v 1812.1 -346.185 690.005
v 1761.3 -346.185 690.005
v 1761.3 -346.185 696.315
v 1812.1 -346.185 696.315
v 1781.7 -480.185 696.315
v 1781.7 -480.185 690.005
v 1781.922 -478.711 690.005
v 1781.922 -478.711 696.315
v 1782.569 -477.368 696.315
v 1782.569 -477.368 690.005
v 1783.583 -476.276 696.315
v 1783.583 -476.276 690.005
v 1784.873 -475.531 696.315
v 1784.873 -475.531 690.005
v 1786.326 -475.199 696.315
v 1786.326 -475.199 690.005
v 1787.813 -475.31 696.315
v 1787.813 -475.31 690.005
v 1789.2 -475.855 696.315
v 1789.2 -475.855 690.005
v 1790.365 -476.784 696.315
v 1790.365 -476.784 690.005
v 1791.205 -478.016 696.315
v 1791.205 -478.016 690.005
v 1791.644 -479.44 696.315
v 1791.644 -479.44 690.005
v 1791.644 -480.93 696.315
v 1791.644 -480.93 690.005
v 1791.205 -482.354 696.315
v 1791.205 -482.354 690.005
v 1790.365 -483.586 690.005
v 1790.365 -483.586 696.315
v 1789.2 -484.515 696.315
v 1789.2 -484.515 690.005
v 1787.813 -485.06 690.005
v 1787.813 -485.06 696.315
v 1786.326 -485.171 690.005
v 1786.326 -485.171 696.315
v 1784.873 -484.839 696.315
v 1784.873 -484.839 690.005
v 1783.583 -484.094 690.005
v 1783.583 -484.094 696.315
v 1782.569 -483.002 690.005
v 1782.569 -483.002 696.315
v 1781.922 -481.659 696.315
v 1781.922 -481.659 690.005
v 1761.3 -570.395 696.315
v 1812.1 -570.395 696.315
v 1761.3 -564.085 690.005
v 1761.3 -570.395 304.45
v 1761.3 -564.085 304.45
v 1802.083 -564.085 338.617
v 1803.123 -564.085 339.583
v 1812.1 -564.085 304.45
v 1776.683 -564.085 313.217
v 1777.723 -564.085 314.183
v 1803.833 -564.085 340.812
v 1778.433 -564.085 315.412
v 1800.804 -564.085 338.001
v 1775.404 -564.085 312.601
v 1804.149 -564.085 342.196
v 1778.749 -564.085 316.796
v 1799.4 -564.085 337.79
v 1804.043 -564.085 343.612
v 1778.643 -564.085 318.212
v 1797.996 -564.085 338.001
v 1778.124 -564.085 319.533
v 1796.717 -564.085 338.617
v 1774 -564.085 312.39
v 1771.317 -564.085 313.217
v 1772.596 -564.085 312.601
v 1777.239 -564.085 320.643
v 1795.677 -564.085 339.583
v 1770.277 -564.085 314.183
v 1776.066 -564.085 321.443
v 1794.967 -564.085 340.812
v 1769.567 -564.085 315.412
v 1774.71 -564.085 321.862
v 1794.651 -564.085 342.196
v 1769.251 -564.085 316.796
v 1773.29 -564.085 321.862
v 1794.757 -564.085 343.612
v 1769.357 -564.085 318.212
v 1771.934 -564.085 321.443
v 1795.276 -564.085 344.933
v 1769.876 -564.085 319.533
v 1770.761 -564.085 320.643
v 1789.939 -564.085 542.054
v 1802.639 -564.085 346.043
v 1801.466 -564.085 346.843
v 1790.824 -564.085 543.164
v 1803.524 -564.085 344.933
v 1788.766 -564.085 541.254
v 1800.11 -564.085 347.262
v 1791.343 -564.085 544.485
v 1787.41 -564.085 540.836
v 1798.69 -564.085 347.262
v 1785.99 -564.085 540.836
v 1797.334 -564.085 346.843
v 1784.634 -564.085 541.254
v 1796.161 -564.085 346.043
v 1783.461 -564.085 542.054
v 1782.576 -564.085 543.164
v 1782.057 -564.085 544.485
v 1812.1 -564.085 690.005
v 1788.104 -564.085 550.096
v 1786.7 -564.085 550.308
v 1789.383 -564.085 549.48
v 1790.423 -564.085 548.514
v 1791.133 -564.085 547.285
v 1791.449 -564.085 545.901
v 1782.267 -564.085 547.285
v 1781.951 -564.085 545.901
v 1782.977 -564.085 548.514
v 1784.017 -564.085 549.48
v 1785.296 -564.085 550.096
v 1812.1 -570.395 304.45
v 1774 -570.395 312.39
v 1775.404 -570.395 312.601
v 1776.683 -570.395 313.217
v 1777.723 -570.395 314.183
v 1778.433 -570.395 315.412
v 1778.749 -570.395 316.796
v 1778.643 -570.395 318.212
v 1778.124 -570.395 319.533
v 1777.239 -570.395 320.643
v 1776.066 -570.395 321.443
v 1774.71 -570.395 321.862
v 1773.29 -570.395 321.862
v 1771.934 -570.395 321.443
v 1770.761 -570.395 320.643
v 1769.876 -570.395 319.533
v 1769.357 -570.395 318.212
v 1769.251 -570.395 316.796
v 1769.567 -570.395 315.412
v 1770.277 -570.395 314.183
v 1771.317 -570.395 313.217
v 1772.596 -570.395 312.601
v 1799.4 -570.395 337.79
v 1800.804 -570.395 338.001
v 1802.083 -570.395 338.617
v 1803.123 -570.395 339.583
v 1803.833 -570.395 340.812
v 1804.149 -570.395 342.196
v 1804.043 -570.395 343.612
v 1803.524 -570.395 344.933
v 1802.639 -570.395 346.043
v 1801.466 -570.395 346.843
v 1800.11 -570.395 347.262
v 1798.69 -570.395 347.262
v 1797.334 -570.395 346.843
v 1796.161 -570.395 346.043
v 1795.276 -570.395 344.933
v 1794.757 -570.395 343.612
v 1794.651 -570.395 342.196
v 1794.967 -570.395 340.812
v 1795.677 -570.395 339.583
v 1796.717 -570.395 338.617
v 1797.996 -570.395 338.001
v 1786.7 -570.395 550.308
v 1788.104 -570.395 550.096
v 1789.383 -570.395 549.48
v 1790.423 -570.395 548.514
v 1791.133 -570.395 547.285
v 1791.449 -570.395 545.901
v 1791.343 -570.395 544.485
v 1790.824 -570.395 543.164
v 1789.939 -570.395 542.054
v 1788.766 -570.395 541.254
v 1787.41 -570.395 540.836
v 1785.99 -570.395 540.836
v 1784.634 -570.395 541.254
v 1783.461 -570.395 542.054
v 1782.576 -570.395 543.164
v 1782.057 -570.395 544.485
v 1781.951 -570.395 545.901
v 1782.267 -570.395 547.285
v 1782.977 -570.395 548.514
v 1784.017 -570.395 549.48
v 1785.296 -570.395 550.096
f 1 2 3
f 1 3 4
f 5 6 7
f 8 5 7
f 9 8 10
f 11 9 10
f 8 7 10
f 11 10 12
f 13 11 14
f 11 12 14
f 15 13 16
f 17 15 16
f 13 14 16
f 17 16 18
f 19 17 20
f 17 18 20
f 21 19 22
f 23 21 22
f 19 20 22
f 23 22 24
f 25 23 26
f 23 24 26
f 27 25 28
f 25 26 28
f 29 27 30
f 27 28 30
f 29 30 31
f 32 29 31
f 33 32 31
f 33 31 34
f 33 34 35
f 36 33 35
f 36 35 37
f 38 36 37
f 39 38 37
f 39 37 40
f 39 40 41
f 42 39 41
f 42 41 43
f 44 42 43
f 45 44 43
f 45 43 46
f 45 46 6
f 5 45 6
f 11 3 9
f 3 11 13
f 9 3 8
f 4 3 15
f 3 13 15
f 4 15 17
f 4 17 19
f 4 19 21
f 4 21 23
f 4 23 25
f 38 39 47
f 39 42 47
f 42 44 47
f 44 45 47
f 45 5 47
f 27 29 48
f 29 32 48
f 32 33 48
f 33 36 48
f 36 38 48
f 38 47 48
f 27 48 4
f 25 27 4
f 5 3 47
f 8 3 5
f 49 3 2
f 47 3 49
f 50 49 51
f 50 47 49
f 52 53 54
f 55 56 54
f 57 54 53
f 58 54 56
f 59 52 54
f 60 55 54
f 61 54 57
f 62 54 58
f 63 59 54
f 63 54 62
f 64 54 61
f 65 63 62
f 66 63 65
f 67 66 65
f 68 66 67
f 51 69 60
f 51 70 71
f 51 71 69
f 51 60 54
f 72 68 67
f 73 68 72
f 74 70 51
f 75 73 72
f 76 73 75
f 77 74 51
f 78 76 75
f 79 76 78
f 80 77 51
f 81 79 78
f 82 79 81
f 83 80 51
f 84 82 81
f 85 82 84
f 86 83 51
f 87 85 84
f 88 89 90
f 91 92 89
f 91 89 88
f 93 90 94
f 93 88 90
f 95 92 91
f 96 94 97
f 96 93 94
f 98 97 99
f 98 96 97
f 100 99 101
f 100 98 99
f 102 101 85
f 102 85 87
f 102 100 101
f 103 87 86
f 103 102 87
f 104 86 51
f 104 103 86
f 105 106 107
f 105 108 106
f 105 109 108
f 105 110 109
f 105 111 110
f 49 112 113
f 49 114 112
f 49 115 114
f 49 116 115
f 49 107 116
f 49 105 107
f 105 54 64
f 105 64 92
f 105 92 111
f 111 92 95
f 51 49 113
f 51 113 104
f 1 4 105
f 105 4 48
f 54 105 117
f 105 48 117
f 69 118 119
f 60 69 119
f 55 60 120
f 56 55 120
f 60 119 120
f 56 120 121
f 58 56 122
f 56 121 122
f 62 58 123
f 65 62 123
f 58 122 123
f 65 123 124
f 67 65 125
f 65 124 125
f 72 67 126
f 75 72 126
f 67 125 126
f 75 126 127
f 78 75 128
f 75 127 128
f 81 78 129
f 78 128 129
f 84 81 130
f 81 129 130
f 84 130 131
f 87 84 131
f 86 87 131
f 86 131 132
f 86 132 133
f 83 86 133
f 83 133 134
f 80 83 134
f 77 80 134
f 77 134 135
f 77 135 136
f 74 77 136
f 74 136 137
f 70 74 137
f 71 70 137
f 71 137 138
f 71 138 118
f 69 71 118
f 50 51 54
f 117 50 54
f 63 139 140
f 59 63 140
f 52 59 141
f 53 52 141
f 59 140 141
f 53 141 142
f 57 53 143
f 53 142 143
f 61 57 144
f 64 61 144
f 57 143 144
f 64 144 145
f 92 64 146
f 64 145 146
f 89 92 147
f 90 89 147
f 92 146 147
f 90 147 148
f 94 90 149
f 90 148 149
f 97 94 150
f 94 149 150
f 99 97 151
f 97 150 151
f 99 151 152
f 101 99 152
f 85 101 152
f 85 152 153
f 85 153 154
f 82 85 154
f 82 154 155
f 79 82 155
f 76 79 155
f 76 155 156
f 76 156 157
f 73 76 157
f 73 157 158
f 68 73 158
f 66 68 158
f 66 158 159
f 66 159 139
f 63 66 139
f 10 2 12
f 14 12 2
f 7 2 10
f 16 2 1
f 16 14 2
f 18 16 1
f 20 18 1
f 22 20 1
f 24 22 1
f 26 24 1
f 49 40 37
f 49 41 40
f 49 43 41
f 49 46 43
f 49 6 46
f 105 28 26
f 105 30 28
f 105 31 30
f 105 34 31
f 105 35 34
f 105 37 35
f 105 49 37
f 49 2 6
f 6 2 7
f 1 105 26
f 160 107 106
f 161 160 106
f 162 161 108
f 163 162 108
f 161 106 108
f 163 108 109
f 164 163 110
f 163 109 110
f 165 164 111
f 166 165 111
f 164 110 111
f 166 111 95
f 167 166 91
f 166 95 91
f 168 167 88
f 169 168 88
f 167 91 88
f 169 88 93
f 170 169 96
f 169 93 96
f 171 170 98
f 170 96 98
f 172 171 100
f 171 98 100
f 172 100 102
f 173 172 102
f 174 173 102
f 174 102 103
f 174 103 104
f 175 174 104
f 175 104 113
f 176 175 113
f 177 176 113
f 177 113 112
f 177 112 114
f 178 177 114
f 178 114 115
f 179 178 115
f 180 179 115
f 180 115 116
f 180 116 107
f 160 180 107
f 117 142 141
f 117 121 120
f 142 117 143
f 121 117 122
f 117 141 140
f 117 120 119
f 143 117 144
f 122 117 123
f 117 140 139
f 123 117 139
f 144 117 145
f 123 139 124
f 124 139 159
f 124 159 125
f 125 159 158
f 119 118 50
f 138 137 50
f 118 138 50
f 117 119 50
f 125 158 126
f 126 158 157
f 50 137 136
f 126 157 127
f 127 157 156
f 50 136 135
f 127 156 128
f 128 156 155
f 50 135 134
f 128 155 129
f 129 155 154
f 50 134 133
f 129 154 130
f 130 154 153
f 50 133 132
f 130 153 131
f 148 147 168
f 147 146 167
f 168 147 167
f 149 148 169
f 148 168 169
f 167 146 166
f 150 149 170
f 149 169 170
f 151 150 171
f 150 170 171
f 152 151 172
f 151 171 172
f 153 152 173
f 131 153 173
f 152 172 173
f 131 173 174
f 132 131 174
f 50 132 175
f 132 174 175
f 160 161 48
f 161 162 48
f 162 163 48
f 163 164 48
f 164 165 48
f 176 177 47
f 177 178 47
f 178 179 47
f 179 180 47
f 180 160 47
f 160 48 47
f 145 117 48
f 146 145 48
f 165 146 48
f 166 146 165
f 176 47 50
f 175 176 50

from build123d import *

# Parameters (mm, degrees)
CROQUIS2_W              = 50.8
CROQUIS2_H              = 6.31
CROQUIS3_W              = 50.8
CROQUIS3_H              = 6.31
CROQUIS4_W              = 60
CROQUIS4_H              = 53.155
SALIENTE_EXTRUIR1_DEPTH = 6.31
CROQUIS5_W              = 60
CROQUIS5_H              = 6.31
CORTAR_EXTRUIR1_DEPTH   = 6.31
CORTAR_EXTRUIR2_DEPTH   = 634
CROQUIS8_W              = 50.8
CROQUIS8_H              = 6.31
SALIENTE_EXTRUIR2_DEPTH = 63.5
CROQUIS9_R              = 5
CORTAR_EXTRUIR3_DEPTH   = 10
CROQUIS10_W             = 790.847933
CROQUIS10_H             = 6.31
CORTAR_EXTRUIR4_DEPTH   = 286
CROQUIS11_W             = 50.8
CROQUIS11_H             = 6.31
CROQUIS11_W_2           = 210
CORTAR_EXTRUIR5_DEPTH   = 13.11
CROQUIS12_W             = 50.8
CROQUIS12_H             = 6.31
SALIENTE_EXTRUIR3_DEPTH = 6.35
CROQUIS13_W             = 50.8
CROQUIS13_H             = 6.35
CORTAR_EXTRUIR6_DEPTH   = 6.35
CROQUIS14_W             = 85.847108528
CROQUIS14_H             = 473.639219469
CORTAR_EXTRUIR7_DEPTH   = 137
CROQUIS15_R             = 4.7625
CORTAR_EXTRUIR8_DEPTH   = 33
CROQUIS16_R             = 5
CORTAR_EXTRUIR9_DEPTH   = 33
CROQUIS18_R             = 4.7625
CORTAR_EXTRUIR10_DEPTH  = 50
CROQUIS19_W             = 50.8
CROQUIS19_H             = 6.31
SALIENTE_EXTRUIR4_DEPTH = 100


with BuildPart() as part:
    # Barrer1: sweep along a curve in space
    with BuildLine() as barrer1_path:
        Line((0, 0, 0), (0, -567.24, 0))
        Line((0, -567.24, 0), (0, -567.24, 336.2))
        Line((0, -567.24, 336.2), (1786.7, -567.24, 336.2))
        Line((1786.7, -567.24, 336.2), (1786.7, -567.24, 693.16))
        Line((1786.7, -567.24, 693.16), (1786.7, -436.23, 693.16))
        Line((1786.7, -436.23, 693.16), (1786.7, -436.23, 1487.162933))
    # Croquis2 → Barrer1 (sweep)
    with BuildSketch(Plane(origin=(0, 0, 0), x_dir=(1, 0, 0), z_dir=(0, 1, 0))):
        Rectangle(CROQUIS2_W, CROQUIS2_H)
        with Locations((210, 0)):
            Rectangle(CROQUIS2_W, CROQUIS2_H)
    sweep(path=barrer1_path.line, transition=Transition.RIGHT)

    # Barrer4: sweep along a curve in space
    with BuildLine() as barrer4_path:
        Line((-0.201028049, -3.155, -3.155), (-0.201028049, -3.155, -207.155))
        Line((-0.201028049, -3.155, -207.155), (-0.201028049, -53.155, -207.155))
    # Croquis3 → Barrer4 (sweep)
    with BuildSketch(Plane(origin=(0, 0, -3.155), x_dir=(-1, 0, 0), z_dir=(0, 0, -1))):
        with Locations((-210, -3.155)):
            Rectangle(CROQUIS3_W, CROQUIS3_H)
        with Locations((0, -3.155)):
            Rectangle(CROQUIS3_W, CROQUIS3_H)
    sweep(path=barrer4_path.line, transition=Transition.RIGHT)

    # Croquis4 → Saliente-Extruir1 (add)
    with BuildSketch(Plane(origin=(0, 0, -210.31), x_dir=(-1, 0, 0), z_dir=(0, 0, -1))):
        with Locations((-154.6, -26.5775)):
            Rectangle(CROQUIS4_W, CROQUIS4_H)
    extrude(amount=-SALIENTE_EXTRUIR1_DEPTH)

    # Croquis5 → Cortar-Extruir1 (cut)
    with BuildSketch(Plane.XY.offset(-204)):
        with Locations((154.6, -3.155)):
            Rectangle(CROQUIS5_W, CROQUIS5_H)
    extrude(amount=-CORTAR_EXTRUIR1_DEPTH, mode=Mode.SUBTRACT)

    # Croquis7 → Cortar-Extruir2 (cut)
    with BuildSketch(Plane(origin=(0, 0, 0), x_dir=(1, 0, 0), z_dir=(0, 1, 0))):
        Polygon((1761.3, -361.6), (2022.1, -361.6), (2022.1, 278.600557529), (-188.115947115, 278.600557529), (-188.115947115, -361.6), align=None)
    extrude(amount=-CORTAR_EXTRUIR2_DEPTH, mode=Mode.SUBTRACT)

    # Croquis8 → Saliente-Extruir2 (add)
    with BuildSketch(Plane(origin=(0, 0, 361.6), x_dir=(-1, 0, 0), z_dir=(0, 0, -1))):
        with Locations((-1786.7, -567.24)):
            Rectangle(CROQUIS8_W, CROQUIS8_H)
    extrude(amount=SALIENTE_EXTRUIR2_DEPTH)

    # Croquis9 → Cortar-Extruir3 (cut)
    with BuildSketch(Plane(origin=(0, -433.075, 0), x_dir=(1, 0, 0), z_dir=(0, 1, 0))):
        with Locations(Location((1786.7, -1454.162933, 0), (0, 0, 270))):
            Circle(CROQUIS9_R)
        with Locations(Location((1786.7, -1234.162933, 0), (0, 0, 270))):
            Circle(CROQUIS9_R)
        with Locations(Location((1996.7, -1234.162933, 0), (0, 0, 270))):
            Circle(CROQUIS9_R)
        with Locations(Location((1996.7, -1454.162933, 0), (0, 0, 270))):
            Circle(CROQUIS9_R)
    extrude(amount=-CORTAR_EXTRUIR3_DEPTH, mode=Mode.SUBTRACT)

    # Croquis10 → Cortar-Extruir4 (cut)
    with BuildSketch(Plane(origin=(2022.1, 0, 0), x_dir=(0, 0, -1), z_dir=(1, 0, 0))):
        with Locations((-1091.7389665, -436.23)):
            Rectangle(CROQUIS10_W, CROQUIS10_H)
    extrude(amount=-CORTAR_EXTRUIR4_DEPTH, mode=Mode.SUBTRACT)

    # Croquis11 → Cortar-Extruir5 (cut)
    with BuildSketch(Plane(origin=(0, -433.075, 0), x_dir=(1, 0, 0), z_dir=(0, 1, 0))):
        with Locations((1996.7, -693.16)):
            Rectangle(CROQUIS11_W, CROQUIS11_H)
        with Locations((1866.3, -693.16)):
            Rectangle(CROQUIS11_W_2, CROQUIS11_H)
    extrude(amount=-CORTAR_EXTRUIR5_DEPTH, mode=Mode.SUBTRACT)

    # Croquis12 → Saliente-Extruir3 (add)
    with BuildSketch(Plane(origin=(0, 0, 361.6), x_dir=(-1, 0, 0), z_dir=(0, 0, -1))):
        with Locations((-1996.7, -567.24)):
            Rectangle(CROQUIS12_W, CROQUIS12_H)
    extrude(amount=SALIENTE_EXTRUIR3_DEPTH)

    # Croquis13 → Cortar-Extruir6 (cut)
    with BuildSketch(Plane(origin=(0, -564.085, 0), x_dir=(1, 0, 0), z_dir=(0, 1, 0))):
        with Locations((1786.7, -301.275)):
            Rectangle(CROQUIS13_W, CROQUIS13_H)
    extrude(amount=-CORTAR_EXTRUIR6_DEPTH, mode=Mode.SUBTRACT)

    # Croquis14 → Cortar-Extruir7 (cut)
    with BuildSketch(Plane(origin=(0, -446.185, 0), x_dir=(1, 0, 0), z_dir=(0, 1, 0))):
        with Locations((1999.254154868, -571.717300183)):
            Rectangle(CROQUIS14_W, CROQUIS14_H)
    extrude(amount=-CORTAR_EXTRUIR7_DEPTH, mode=Mode.SUBTRACT)

    # Croquis15 → Cortar-Extruir8 (cut)
    with BuildSketch(Plane(origin=(0, -564.085, 0), x_dir=(1, 0, 0), z_dir=(0, 1, 0))):
        with Locations(Location((1786.7, -545.545, 0), (0, 0, 270))):
            Circle(CROQUIS15_R)
    extrude(amount=-CORTAR_EXTRUIR8_DEPTH, mode=Mode.SUBTRACT)

    # Croquis16 → Cortar-Extruir9 (cut)
    with BuildSketch(Plane(origin=(0, 0, 690.005), x_dir=(-1, 0, 0), z_dir=(0, 0, -1))):
        with Locations((-1786.7, -480.185)):
            Circle(CROQUIS16_R)
    extrude(amount=-CORTAR_EXTRUIR9_DEPTH, mode=Mode.SUBTRACT)

    # Croquis18 → Cortar-Extruir10 (cut)
    with BuildSketch(Plane(origin=(0, -570.395, 0), x_dir=(-1, 0, 0), z_dir=(0, -1, 0))):
        with Locations(Location((-1799.399999999, -342.552204666, 0), (0, 0, 90))):
            Circle(CROQUIS18_R)
        with Locations(Location((-1773.999999999, -317.152204666, 0), (0, 0, 90))):
            Circle(CROQUIS18_R)
    extrude(amount=-CORTAR_EXTRUIR10_DEPTH, mode=Mode.SUBTRACT)

    # Croquis19 → Saliente-Extruir4 (add)
    with BuildSketch(Plane(origin=(0, -446.185, 0), x_dir=(1, 0, 0), z_dir=(0, 1, 0))):
        with Locations((1786.7, -693.16)):
            Rectangle(CROQUIS19_W, CROQUIS19_H)
    extrude(amount=SALIENTE_EXTRUIR4_DEPTH)


solid = part.part
